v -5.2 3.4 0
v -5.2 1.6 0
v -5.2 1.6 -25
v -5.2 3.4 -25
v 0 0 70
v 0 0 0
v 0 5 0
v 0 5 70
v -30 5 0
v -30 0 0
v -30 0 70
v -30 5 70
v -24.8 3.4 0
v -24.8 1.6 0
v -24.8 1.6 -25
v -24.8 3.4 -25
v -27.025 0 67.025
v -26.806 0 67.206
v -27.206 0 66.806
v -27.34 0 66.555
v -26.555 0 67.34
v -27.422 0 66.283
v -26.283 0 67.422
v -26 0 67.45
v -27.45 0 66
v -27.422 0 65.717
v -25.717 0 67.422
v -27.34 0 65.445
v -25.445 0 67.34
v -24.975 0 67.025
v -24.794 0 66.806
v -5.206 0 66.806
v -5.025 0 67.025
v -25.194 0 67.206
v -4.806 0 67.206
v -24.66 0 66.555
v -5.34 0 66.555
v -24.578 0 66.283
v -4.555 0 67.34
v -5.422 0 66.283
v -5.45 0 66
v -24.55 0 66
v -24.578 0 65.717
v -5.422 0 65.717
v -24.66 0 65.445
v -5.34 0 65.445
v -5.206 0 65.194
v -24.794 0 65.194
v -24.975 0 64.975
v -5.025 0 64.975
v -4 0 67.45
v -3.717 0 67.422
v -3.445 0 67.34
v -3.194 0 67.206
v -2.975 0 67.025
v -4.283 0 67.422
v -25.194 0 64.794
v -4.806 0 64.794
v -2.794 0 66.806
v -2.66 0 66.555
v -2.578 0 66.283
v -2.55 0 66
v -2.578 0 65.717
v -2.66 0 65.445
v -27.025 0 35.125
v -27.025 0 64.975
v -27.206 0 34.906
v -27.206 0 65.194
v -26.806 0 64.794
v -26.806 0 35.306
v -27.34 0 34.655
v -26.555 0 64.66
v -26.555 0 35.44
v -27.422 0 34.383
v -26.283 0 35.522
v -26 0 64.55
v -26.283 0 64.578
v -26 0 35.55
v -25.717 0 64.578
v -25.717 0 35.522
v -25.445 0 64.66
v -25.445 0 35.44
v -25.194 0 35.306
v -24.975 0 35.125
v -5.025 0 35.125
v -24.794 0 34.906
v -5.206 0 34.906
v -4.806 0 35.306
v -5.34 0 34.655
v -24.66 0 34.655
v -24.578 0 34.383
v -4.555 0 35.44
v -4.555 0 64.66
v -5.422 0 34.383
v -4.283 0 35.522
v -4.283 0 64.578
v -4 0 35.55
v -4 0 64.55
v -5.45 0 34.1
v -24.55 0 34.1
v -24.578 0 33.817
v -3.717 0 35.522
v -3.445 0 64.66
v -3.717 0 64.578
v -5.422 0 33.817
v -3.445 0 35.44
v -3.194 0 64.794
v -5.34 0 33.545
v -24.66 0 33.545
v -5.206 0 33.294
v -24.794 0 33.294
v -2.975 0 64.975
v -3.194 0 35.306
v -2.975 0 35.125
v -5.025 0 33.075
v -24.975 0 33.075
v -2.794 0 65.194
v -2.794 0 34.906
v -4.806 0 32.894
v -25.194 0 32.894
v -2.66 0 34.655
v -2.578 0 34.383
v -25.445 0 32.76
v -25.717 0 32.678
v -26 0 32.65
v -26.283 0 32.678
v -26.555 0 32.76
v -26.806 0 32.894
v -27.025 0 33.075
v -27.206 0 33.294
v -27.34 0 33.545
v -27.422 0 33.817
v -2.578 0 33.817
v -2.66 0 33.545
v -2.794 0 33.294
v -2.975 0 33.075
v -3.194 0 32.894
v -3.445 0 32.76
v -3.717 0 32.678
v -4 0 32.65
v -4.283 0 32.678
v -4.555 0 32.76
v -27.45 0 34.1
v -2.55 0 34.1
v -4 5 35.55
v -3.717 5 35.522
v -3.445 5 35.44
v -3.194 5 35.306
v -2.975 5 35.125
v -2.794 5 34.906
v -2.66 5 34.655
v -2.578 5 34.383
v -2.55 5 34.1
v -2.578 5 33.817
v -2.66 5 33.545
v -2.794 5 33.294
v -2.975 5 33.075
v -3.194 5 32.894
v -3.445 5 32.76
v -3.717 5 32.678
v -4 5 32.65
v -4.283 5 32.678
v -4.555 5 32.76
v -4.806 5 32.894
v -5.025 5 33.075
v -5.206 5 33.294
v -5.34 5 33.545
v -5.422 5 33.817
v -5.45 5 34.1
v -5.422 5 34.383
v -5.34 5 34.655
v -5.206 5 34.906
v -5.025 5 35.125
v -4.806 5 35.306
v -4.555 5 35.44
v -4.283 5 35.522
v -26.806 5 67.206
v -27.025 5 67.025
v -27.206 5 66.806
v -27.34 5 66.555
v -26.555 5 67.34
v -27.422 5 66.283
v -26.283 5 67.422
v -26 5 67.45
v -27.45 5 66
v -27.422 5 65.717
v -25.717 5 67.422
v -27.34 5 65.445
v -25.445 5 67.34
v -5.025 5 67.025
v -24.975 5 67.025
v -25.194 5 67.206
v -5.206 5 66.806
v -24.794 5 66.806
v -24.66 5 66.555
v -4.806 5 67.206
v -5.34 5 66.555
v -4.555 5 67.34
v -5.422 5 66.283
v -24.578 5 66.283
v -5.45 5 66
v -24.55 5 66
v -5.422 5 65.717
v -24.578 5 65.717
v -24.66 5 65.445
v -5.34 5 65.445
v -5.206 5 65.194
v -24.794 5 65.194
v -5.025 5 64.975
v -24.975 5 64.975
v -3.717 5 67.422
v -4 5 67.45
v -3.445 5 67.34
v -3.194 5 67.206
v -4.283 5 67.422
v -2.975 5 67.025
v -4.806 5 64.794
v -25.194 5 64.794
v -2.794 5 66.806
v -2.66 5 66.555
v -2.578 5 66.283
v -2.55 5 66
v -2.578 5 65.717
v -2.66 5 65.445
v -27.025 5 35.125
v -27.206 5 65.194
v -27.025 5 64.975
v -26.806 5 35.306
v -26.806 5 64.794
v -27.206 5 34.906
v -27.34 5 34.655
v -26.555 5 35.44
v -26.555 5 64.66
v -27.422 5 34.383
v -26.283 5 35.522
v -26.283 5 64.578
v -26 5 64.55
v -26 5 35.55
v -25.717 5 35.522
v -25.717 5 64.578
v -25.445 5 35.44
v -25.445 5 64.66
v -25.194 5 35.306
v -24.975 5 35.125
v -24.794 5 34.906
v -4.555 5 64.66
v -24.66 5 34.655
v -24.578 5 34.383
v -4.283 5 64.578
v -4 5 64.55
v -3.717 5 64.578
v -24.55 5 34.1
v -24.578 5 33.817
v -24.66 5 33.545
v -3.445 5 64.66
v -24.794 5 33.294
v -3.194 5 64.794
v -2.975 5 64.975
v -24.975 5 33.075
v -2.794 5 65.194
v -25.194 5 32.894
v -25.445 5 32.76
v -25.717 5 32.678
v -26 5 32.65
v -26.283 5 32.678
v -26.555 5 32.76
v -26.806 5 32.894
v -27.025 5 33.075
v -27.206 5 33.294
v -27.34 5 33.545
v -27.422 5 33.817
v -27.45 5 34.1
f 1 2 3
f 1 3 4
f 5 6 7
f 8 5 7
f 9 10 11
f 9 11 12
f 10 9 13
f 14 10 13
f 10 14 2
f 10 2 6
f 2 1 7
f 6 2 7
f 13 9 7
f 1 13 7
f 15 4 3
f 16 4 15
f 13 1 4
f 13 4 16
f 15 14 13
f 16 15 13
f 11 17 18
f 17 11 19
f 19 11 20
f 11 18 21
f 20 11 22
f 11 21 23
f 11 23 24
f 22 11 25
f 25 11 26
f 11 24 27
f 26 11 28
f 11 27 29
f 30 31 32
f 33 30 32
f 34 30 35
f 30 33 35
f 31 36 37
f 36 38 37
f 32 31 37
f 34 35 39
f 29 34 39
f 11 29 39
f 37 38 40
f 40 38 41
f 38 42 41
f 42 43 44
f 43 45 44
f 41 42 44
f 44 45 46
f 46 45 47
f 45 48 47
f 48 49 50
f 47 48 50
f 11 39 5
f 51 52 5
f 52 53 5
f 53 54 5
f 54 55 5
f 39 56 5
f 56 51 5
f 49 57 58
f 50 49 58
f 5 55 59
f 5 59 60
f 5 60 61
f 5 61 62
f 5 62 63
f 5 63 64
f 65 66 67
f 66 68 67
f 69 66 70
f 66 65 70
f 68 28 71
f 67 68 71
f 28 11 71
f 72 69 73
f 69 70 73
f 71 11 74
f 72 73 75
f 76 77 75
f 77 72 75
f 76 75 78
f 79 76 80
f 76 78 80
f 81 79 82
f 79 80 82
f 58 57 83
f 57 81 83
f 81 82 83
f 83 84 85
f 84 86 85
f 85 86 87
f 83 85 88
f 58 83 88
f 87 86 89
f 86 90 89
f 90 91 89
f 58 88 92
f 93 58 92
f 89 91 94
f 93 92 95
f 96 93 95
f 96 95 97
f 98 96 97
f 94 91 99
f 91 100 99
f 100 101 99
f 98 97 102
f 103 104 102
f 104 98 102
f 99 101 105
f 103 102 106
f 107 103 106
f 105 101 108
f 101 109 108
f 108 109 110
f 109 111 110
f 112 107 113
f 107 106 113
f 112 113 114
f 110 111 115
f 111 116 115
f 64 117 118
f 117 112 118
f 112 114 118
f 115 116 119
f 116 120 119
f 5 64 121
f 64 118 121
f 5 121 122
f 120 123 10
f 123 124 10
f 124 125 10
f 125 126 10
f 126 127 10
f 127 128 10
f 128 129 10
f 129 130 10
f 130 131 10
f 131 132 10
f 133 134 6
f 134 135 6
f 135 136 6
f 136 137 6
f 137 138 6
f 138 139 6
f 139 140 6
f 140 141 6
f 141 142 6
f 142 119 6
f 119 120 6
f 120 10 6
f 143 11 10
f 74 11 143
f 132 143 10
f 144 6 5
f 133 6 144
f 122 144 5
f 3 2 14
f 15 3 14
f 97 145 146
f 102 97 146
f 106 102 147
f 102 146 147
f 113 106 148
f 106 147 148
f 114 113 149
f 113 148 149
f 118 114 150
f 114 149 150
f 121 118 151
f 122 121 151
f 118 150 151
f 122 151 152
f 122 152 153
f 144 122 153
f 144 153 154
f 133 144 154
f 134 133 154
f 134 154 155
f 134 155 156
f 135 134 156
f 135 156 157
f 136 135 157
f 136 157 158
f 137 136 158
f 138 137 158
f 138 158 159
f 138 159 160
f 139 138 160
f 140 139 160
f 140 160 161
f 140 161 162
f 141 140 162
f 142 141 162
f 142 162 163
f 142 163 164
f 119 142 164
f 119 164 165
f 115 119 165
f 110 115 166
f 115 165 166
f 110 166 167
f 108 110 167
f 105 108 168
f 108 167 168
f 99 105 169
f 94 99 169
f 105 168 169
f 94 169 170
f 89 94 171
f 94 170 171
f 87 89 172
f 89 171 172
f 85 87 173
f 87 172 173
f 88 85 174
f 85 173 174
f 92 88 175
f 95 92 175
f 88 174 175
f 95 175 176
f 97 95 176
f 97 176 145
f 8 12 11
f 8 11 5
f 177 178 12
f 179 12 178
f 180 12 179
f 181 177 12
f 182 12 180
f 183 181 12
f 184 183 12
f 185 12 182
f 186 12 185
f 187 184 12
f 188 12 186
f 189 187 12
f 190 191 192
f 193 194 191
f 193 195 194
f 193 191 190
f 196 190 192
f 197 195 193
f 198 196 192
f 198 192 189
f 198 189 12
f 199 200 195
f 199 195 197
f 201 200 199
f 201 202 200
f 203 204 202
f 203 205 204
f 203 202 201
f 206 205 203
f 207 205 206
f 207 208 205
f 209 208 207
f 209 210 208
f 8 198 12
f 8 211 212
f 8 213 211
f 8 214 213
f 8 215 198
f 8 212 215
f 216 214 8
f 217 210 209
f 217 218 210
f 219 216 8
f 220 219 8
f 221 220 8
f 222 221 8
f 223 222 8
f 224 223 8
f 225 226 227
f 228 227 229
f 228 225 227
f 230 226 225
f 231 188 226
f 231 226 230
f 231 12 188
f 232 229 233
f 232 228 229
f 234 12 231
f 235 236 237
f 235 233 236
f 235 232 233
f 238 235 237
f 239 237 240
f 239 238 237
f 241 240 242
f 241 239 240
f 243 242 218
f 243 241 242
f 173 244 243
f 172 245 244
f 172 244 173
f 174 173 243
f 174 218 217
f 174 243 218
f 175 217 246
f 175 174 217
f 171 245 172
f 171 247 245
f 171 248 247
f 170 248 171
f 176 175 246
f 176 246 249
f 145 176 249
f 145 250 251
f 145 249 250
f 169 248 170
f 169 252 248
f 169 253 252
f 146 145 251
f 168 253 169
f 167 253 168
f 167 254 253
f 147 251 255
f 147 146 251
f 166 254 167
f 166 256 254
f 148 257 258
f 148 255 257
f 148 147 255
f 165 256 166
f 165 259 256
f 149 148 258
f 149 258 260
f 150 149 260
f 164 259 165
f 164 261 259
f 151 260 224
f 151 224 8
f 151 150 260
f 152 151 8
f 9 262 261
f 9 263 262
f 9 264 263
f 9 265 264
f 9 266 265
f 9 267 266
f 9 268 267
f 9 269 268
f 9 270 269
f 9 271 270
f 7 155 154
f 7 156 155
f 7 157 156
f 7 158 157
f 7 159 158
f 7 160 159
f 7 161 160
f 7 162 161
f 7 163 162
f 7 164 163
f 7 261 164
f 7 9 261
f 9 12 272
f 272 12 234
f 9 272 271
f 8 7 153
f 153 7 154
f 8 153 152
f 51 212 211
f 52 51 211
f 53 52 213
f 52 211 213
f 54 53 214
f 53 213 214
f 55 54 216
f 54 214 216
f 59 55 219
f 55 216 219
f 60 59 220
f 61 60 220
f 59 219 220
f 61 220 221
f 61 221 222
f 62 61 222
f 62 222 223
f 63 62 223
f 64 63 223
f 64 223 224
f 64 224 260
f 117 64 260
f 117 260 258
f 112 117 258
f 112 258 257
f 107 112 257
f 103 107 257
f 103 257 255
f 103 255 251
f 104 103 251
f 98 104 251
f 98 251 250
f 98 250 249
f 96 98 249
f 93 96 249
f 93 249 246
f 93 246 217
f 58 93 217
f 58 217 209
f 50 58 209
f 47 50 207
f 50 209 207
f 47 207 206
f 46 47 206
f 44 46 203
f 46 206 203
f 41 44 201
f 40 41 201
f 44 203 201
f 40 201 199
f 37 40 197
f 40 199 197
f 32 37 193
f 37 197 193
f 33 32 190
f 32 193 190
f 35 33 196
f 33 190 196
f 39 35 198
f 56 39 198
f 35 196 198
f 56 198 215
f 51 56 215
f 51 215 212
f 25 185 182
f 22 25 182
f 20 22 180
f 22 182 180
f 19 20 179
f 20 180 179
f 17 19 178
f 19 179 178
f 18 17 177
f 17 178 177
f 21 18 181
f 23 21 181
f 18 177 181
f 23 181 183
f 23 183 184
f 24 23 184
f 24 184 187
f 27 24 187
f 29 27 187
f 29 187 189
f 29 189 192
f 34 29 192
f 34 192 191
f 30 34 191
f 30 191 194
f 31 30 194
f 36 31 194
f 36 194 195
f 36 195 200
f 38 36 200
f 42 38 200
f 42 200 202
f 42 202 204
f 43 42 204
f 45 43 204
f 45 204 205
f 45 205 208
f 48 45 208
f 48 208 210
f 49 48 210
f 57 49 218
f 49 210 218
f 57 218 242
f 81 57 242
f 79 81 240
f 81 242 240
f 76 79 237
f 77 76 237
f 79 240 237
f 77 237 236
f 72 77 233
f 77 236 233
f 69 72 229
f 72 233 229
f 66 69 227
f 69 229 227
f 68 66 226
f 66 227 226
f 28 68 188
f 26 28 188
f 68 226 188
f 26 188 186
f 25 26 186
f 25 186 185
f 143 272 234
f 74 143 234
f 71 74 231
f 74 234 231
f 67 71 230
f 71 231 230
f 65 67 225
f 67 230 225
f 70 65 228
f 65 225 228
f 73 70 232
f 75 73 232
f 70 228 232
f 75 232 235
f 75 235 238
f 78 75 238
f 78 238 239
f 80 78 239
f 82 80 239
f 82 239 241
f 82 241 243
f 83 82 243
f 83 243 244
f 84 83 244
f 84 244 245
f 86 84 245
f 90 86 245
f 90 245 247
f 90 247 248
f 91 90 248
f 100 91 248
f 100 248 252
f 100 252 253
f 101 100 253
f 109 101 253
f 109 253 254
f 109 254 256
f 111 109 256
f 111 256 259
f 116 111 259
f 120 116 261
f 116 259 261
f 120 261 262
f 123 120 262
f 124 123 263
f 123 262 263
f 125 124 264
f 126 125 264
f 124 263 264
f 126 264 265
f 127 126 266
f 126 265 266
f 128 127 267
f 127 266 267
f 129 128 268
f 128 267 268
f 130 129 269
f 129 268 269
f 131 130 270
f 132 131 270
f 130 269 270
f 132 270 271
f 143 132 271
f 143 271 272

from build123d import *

# Parameters (mm, degrees)
SKETCH_1_W          = 30
SKETCH_1_H          = 5
EXTRUDE_1_DEPTH     = 70
SKETCH_2_R          = 1.45
CUT_EXTRUDE_1_DEPTH = 60
SKETCH_4_W          = 19.6
SKETCH_4_H          = 1.8
EXTRUDE_2_DEPTH     = 25


with BuildPart() as part:
    # 草图1 → 凸台-拉伸1 (new body)
    with BuildSketch(Plane.XY):
        with Locations((-15, 2.5)):
            Rectangle(SKETCH_1_W, SKETCH_1_H)
    extrude(amount=EXTRUDE_1_DEPTH)

    # 草图2 → 切除-拉伸1 (cut)
    with BuildSketch(Plane(origin=(0, 5, 0), x_dir=(1, 0, 0), z_dir=(0, 1, 0))):
        with Locations(Location((-26, -66, 0), (0, 0, 180))):
            Circle(SKETCH_2_R)
        with Locations(Location((-26, -34.1, 0), (0, 0, 180))):
            Circle(SKETCH_2_R)
        with Locations(Location((-4, -66, 0), (0, 0, 270))):
            Circle(SKETCH_2_R)
        with Locations(Location((-4, -34.1, 0), (0, 0, 270))):
            Circle(SKETCH_2_R)
    extrude(amount=-CUT_EXTRUDE_1_DEPTH, mode=Mode.SUBTRACT)

    # 草图4 → 凸台-拉伸2 (add)
    with BuildSketch(Plane(origin=(0, 0, 0), x_dir=(-1, 0, 0), z_dir=(0, 0, -1))):
        with Locations((15, 2.5)):
            Rectangle(SKETCH_4_W, SKETCH_4_H)
    extrude(amount=EXTRUDE_2_DEPTH)


solid = part.part
